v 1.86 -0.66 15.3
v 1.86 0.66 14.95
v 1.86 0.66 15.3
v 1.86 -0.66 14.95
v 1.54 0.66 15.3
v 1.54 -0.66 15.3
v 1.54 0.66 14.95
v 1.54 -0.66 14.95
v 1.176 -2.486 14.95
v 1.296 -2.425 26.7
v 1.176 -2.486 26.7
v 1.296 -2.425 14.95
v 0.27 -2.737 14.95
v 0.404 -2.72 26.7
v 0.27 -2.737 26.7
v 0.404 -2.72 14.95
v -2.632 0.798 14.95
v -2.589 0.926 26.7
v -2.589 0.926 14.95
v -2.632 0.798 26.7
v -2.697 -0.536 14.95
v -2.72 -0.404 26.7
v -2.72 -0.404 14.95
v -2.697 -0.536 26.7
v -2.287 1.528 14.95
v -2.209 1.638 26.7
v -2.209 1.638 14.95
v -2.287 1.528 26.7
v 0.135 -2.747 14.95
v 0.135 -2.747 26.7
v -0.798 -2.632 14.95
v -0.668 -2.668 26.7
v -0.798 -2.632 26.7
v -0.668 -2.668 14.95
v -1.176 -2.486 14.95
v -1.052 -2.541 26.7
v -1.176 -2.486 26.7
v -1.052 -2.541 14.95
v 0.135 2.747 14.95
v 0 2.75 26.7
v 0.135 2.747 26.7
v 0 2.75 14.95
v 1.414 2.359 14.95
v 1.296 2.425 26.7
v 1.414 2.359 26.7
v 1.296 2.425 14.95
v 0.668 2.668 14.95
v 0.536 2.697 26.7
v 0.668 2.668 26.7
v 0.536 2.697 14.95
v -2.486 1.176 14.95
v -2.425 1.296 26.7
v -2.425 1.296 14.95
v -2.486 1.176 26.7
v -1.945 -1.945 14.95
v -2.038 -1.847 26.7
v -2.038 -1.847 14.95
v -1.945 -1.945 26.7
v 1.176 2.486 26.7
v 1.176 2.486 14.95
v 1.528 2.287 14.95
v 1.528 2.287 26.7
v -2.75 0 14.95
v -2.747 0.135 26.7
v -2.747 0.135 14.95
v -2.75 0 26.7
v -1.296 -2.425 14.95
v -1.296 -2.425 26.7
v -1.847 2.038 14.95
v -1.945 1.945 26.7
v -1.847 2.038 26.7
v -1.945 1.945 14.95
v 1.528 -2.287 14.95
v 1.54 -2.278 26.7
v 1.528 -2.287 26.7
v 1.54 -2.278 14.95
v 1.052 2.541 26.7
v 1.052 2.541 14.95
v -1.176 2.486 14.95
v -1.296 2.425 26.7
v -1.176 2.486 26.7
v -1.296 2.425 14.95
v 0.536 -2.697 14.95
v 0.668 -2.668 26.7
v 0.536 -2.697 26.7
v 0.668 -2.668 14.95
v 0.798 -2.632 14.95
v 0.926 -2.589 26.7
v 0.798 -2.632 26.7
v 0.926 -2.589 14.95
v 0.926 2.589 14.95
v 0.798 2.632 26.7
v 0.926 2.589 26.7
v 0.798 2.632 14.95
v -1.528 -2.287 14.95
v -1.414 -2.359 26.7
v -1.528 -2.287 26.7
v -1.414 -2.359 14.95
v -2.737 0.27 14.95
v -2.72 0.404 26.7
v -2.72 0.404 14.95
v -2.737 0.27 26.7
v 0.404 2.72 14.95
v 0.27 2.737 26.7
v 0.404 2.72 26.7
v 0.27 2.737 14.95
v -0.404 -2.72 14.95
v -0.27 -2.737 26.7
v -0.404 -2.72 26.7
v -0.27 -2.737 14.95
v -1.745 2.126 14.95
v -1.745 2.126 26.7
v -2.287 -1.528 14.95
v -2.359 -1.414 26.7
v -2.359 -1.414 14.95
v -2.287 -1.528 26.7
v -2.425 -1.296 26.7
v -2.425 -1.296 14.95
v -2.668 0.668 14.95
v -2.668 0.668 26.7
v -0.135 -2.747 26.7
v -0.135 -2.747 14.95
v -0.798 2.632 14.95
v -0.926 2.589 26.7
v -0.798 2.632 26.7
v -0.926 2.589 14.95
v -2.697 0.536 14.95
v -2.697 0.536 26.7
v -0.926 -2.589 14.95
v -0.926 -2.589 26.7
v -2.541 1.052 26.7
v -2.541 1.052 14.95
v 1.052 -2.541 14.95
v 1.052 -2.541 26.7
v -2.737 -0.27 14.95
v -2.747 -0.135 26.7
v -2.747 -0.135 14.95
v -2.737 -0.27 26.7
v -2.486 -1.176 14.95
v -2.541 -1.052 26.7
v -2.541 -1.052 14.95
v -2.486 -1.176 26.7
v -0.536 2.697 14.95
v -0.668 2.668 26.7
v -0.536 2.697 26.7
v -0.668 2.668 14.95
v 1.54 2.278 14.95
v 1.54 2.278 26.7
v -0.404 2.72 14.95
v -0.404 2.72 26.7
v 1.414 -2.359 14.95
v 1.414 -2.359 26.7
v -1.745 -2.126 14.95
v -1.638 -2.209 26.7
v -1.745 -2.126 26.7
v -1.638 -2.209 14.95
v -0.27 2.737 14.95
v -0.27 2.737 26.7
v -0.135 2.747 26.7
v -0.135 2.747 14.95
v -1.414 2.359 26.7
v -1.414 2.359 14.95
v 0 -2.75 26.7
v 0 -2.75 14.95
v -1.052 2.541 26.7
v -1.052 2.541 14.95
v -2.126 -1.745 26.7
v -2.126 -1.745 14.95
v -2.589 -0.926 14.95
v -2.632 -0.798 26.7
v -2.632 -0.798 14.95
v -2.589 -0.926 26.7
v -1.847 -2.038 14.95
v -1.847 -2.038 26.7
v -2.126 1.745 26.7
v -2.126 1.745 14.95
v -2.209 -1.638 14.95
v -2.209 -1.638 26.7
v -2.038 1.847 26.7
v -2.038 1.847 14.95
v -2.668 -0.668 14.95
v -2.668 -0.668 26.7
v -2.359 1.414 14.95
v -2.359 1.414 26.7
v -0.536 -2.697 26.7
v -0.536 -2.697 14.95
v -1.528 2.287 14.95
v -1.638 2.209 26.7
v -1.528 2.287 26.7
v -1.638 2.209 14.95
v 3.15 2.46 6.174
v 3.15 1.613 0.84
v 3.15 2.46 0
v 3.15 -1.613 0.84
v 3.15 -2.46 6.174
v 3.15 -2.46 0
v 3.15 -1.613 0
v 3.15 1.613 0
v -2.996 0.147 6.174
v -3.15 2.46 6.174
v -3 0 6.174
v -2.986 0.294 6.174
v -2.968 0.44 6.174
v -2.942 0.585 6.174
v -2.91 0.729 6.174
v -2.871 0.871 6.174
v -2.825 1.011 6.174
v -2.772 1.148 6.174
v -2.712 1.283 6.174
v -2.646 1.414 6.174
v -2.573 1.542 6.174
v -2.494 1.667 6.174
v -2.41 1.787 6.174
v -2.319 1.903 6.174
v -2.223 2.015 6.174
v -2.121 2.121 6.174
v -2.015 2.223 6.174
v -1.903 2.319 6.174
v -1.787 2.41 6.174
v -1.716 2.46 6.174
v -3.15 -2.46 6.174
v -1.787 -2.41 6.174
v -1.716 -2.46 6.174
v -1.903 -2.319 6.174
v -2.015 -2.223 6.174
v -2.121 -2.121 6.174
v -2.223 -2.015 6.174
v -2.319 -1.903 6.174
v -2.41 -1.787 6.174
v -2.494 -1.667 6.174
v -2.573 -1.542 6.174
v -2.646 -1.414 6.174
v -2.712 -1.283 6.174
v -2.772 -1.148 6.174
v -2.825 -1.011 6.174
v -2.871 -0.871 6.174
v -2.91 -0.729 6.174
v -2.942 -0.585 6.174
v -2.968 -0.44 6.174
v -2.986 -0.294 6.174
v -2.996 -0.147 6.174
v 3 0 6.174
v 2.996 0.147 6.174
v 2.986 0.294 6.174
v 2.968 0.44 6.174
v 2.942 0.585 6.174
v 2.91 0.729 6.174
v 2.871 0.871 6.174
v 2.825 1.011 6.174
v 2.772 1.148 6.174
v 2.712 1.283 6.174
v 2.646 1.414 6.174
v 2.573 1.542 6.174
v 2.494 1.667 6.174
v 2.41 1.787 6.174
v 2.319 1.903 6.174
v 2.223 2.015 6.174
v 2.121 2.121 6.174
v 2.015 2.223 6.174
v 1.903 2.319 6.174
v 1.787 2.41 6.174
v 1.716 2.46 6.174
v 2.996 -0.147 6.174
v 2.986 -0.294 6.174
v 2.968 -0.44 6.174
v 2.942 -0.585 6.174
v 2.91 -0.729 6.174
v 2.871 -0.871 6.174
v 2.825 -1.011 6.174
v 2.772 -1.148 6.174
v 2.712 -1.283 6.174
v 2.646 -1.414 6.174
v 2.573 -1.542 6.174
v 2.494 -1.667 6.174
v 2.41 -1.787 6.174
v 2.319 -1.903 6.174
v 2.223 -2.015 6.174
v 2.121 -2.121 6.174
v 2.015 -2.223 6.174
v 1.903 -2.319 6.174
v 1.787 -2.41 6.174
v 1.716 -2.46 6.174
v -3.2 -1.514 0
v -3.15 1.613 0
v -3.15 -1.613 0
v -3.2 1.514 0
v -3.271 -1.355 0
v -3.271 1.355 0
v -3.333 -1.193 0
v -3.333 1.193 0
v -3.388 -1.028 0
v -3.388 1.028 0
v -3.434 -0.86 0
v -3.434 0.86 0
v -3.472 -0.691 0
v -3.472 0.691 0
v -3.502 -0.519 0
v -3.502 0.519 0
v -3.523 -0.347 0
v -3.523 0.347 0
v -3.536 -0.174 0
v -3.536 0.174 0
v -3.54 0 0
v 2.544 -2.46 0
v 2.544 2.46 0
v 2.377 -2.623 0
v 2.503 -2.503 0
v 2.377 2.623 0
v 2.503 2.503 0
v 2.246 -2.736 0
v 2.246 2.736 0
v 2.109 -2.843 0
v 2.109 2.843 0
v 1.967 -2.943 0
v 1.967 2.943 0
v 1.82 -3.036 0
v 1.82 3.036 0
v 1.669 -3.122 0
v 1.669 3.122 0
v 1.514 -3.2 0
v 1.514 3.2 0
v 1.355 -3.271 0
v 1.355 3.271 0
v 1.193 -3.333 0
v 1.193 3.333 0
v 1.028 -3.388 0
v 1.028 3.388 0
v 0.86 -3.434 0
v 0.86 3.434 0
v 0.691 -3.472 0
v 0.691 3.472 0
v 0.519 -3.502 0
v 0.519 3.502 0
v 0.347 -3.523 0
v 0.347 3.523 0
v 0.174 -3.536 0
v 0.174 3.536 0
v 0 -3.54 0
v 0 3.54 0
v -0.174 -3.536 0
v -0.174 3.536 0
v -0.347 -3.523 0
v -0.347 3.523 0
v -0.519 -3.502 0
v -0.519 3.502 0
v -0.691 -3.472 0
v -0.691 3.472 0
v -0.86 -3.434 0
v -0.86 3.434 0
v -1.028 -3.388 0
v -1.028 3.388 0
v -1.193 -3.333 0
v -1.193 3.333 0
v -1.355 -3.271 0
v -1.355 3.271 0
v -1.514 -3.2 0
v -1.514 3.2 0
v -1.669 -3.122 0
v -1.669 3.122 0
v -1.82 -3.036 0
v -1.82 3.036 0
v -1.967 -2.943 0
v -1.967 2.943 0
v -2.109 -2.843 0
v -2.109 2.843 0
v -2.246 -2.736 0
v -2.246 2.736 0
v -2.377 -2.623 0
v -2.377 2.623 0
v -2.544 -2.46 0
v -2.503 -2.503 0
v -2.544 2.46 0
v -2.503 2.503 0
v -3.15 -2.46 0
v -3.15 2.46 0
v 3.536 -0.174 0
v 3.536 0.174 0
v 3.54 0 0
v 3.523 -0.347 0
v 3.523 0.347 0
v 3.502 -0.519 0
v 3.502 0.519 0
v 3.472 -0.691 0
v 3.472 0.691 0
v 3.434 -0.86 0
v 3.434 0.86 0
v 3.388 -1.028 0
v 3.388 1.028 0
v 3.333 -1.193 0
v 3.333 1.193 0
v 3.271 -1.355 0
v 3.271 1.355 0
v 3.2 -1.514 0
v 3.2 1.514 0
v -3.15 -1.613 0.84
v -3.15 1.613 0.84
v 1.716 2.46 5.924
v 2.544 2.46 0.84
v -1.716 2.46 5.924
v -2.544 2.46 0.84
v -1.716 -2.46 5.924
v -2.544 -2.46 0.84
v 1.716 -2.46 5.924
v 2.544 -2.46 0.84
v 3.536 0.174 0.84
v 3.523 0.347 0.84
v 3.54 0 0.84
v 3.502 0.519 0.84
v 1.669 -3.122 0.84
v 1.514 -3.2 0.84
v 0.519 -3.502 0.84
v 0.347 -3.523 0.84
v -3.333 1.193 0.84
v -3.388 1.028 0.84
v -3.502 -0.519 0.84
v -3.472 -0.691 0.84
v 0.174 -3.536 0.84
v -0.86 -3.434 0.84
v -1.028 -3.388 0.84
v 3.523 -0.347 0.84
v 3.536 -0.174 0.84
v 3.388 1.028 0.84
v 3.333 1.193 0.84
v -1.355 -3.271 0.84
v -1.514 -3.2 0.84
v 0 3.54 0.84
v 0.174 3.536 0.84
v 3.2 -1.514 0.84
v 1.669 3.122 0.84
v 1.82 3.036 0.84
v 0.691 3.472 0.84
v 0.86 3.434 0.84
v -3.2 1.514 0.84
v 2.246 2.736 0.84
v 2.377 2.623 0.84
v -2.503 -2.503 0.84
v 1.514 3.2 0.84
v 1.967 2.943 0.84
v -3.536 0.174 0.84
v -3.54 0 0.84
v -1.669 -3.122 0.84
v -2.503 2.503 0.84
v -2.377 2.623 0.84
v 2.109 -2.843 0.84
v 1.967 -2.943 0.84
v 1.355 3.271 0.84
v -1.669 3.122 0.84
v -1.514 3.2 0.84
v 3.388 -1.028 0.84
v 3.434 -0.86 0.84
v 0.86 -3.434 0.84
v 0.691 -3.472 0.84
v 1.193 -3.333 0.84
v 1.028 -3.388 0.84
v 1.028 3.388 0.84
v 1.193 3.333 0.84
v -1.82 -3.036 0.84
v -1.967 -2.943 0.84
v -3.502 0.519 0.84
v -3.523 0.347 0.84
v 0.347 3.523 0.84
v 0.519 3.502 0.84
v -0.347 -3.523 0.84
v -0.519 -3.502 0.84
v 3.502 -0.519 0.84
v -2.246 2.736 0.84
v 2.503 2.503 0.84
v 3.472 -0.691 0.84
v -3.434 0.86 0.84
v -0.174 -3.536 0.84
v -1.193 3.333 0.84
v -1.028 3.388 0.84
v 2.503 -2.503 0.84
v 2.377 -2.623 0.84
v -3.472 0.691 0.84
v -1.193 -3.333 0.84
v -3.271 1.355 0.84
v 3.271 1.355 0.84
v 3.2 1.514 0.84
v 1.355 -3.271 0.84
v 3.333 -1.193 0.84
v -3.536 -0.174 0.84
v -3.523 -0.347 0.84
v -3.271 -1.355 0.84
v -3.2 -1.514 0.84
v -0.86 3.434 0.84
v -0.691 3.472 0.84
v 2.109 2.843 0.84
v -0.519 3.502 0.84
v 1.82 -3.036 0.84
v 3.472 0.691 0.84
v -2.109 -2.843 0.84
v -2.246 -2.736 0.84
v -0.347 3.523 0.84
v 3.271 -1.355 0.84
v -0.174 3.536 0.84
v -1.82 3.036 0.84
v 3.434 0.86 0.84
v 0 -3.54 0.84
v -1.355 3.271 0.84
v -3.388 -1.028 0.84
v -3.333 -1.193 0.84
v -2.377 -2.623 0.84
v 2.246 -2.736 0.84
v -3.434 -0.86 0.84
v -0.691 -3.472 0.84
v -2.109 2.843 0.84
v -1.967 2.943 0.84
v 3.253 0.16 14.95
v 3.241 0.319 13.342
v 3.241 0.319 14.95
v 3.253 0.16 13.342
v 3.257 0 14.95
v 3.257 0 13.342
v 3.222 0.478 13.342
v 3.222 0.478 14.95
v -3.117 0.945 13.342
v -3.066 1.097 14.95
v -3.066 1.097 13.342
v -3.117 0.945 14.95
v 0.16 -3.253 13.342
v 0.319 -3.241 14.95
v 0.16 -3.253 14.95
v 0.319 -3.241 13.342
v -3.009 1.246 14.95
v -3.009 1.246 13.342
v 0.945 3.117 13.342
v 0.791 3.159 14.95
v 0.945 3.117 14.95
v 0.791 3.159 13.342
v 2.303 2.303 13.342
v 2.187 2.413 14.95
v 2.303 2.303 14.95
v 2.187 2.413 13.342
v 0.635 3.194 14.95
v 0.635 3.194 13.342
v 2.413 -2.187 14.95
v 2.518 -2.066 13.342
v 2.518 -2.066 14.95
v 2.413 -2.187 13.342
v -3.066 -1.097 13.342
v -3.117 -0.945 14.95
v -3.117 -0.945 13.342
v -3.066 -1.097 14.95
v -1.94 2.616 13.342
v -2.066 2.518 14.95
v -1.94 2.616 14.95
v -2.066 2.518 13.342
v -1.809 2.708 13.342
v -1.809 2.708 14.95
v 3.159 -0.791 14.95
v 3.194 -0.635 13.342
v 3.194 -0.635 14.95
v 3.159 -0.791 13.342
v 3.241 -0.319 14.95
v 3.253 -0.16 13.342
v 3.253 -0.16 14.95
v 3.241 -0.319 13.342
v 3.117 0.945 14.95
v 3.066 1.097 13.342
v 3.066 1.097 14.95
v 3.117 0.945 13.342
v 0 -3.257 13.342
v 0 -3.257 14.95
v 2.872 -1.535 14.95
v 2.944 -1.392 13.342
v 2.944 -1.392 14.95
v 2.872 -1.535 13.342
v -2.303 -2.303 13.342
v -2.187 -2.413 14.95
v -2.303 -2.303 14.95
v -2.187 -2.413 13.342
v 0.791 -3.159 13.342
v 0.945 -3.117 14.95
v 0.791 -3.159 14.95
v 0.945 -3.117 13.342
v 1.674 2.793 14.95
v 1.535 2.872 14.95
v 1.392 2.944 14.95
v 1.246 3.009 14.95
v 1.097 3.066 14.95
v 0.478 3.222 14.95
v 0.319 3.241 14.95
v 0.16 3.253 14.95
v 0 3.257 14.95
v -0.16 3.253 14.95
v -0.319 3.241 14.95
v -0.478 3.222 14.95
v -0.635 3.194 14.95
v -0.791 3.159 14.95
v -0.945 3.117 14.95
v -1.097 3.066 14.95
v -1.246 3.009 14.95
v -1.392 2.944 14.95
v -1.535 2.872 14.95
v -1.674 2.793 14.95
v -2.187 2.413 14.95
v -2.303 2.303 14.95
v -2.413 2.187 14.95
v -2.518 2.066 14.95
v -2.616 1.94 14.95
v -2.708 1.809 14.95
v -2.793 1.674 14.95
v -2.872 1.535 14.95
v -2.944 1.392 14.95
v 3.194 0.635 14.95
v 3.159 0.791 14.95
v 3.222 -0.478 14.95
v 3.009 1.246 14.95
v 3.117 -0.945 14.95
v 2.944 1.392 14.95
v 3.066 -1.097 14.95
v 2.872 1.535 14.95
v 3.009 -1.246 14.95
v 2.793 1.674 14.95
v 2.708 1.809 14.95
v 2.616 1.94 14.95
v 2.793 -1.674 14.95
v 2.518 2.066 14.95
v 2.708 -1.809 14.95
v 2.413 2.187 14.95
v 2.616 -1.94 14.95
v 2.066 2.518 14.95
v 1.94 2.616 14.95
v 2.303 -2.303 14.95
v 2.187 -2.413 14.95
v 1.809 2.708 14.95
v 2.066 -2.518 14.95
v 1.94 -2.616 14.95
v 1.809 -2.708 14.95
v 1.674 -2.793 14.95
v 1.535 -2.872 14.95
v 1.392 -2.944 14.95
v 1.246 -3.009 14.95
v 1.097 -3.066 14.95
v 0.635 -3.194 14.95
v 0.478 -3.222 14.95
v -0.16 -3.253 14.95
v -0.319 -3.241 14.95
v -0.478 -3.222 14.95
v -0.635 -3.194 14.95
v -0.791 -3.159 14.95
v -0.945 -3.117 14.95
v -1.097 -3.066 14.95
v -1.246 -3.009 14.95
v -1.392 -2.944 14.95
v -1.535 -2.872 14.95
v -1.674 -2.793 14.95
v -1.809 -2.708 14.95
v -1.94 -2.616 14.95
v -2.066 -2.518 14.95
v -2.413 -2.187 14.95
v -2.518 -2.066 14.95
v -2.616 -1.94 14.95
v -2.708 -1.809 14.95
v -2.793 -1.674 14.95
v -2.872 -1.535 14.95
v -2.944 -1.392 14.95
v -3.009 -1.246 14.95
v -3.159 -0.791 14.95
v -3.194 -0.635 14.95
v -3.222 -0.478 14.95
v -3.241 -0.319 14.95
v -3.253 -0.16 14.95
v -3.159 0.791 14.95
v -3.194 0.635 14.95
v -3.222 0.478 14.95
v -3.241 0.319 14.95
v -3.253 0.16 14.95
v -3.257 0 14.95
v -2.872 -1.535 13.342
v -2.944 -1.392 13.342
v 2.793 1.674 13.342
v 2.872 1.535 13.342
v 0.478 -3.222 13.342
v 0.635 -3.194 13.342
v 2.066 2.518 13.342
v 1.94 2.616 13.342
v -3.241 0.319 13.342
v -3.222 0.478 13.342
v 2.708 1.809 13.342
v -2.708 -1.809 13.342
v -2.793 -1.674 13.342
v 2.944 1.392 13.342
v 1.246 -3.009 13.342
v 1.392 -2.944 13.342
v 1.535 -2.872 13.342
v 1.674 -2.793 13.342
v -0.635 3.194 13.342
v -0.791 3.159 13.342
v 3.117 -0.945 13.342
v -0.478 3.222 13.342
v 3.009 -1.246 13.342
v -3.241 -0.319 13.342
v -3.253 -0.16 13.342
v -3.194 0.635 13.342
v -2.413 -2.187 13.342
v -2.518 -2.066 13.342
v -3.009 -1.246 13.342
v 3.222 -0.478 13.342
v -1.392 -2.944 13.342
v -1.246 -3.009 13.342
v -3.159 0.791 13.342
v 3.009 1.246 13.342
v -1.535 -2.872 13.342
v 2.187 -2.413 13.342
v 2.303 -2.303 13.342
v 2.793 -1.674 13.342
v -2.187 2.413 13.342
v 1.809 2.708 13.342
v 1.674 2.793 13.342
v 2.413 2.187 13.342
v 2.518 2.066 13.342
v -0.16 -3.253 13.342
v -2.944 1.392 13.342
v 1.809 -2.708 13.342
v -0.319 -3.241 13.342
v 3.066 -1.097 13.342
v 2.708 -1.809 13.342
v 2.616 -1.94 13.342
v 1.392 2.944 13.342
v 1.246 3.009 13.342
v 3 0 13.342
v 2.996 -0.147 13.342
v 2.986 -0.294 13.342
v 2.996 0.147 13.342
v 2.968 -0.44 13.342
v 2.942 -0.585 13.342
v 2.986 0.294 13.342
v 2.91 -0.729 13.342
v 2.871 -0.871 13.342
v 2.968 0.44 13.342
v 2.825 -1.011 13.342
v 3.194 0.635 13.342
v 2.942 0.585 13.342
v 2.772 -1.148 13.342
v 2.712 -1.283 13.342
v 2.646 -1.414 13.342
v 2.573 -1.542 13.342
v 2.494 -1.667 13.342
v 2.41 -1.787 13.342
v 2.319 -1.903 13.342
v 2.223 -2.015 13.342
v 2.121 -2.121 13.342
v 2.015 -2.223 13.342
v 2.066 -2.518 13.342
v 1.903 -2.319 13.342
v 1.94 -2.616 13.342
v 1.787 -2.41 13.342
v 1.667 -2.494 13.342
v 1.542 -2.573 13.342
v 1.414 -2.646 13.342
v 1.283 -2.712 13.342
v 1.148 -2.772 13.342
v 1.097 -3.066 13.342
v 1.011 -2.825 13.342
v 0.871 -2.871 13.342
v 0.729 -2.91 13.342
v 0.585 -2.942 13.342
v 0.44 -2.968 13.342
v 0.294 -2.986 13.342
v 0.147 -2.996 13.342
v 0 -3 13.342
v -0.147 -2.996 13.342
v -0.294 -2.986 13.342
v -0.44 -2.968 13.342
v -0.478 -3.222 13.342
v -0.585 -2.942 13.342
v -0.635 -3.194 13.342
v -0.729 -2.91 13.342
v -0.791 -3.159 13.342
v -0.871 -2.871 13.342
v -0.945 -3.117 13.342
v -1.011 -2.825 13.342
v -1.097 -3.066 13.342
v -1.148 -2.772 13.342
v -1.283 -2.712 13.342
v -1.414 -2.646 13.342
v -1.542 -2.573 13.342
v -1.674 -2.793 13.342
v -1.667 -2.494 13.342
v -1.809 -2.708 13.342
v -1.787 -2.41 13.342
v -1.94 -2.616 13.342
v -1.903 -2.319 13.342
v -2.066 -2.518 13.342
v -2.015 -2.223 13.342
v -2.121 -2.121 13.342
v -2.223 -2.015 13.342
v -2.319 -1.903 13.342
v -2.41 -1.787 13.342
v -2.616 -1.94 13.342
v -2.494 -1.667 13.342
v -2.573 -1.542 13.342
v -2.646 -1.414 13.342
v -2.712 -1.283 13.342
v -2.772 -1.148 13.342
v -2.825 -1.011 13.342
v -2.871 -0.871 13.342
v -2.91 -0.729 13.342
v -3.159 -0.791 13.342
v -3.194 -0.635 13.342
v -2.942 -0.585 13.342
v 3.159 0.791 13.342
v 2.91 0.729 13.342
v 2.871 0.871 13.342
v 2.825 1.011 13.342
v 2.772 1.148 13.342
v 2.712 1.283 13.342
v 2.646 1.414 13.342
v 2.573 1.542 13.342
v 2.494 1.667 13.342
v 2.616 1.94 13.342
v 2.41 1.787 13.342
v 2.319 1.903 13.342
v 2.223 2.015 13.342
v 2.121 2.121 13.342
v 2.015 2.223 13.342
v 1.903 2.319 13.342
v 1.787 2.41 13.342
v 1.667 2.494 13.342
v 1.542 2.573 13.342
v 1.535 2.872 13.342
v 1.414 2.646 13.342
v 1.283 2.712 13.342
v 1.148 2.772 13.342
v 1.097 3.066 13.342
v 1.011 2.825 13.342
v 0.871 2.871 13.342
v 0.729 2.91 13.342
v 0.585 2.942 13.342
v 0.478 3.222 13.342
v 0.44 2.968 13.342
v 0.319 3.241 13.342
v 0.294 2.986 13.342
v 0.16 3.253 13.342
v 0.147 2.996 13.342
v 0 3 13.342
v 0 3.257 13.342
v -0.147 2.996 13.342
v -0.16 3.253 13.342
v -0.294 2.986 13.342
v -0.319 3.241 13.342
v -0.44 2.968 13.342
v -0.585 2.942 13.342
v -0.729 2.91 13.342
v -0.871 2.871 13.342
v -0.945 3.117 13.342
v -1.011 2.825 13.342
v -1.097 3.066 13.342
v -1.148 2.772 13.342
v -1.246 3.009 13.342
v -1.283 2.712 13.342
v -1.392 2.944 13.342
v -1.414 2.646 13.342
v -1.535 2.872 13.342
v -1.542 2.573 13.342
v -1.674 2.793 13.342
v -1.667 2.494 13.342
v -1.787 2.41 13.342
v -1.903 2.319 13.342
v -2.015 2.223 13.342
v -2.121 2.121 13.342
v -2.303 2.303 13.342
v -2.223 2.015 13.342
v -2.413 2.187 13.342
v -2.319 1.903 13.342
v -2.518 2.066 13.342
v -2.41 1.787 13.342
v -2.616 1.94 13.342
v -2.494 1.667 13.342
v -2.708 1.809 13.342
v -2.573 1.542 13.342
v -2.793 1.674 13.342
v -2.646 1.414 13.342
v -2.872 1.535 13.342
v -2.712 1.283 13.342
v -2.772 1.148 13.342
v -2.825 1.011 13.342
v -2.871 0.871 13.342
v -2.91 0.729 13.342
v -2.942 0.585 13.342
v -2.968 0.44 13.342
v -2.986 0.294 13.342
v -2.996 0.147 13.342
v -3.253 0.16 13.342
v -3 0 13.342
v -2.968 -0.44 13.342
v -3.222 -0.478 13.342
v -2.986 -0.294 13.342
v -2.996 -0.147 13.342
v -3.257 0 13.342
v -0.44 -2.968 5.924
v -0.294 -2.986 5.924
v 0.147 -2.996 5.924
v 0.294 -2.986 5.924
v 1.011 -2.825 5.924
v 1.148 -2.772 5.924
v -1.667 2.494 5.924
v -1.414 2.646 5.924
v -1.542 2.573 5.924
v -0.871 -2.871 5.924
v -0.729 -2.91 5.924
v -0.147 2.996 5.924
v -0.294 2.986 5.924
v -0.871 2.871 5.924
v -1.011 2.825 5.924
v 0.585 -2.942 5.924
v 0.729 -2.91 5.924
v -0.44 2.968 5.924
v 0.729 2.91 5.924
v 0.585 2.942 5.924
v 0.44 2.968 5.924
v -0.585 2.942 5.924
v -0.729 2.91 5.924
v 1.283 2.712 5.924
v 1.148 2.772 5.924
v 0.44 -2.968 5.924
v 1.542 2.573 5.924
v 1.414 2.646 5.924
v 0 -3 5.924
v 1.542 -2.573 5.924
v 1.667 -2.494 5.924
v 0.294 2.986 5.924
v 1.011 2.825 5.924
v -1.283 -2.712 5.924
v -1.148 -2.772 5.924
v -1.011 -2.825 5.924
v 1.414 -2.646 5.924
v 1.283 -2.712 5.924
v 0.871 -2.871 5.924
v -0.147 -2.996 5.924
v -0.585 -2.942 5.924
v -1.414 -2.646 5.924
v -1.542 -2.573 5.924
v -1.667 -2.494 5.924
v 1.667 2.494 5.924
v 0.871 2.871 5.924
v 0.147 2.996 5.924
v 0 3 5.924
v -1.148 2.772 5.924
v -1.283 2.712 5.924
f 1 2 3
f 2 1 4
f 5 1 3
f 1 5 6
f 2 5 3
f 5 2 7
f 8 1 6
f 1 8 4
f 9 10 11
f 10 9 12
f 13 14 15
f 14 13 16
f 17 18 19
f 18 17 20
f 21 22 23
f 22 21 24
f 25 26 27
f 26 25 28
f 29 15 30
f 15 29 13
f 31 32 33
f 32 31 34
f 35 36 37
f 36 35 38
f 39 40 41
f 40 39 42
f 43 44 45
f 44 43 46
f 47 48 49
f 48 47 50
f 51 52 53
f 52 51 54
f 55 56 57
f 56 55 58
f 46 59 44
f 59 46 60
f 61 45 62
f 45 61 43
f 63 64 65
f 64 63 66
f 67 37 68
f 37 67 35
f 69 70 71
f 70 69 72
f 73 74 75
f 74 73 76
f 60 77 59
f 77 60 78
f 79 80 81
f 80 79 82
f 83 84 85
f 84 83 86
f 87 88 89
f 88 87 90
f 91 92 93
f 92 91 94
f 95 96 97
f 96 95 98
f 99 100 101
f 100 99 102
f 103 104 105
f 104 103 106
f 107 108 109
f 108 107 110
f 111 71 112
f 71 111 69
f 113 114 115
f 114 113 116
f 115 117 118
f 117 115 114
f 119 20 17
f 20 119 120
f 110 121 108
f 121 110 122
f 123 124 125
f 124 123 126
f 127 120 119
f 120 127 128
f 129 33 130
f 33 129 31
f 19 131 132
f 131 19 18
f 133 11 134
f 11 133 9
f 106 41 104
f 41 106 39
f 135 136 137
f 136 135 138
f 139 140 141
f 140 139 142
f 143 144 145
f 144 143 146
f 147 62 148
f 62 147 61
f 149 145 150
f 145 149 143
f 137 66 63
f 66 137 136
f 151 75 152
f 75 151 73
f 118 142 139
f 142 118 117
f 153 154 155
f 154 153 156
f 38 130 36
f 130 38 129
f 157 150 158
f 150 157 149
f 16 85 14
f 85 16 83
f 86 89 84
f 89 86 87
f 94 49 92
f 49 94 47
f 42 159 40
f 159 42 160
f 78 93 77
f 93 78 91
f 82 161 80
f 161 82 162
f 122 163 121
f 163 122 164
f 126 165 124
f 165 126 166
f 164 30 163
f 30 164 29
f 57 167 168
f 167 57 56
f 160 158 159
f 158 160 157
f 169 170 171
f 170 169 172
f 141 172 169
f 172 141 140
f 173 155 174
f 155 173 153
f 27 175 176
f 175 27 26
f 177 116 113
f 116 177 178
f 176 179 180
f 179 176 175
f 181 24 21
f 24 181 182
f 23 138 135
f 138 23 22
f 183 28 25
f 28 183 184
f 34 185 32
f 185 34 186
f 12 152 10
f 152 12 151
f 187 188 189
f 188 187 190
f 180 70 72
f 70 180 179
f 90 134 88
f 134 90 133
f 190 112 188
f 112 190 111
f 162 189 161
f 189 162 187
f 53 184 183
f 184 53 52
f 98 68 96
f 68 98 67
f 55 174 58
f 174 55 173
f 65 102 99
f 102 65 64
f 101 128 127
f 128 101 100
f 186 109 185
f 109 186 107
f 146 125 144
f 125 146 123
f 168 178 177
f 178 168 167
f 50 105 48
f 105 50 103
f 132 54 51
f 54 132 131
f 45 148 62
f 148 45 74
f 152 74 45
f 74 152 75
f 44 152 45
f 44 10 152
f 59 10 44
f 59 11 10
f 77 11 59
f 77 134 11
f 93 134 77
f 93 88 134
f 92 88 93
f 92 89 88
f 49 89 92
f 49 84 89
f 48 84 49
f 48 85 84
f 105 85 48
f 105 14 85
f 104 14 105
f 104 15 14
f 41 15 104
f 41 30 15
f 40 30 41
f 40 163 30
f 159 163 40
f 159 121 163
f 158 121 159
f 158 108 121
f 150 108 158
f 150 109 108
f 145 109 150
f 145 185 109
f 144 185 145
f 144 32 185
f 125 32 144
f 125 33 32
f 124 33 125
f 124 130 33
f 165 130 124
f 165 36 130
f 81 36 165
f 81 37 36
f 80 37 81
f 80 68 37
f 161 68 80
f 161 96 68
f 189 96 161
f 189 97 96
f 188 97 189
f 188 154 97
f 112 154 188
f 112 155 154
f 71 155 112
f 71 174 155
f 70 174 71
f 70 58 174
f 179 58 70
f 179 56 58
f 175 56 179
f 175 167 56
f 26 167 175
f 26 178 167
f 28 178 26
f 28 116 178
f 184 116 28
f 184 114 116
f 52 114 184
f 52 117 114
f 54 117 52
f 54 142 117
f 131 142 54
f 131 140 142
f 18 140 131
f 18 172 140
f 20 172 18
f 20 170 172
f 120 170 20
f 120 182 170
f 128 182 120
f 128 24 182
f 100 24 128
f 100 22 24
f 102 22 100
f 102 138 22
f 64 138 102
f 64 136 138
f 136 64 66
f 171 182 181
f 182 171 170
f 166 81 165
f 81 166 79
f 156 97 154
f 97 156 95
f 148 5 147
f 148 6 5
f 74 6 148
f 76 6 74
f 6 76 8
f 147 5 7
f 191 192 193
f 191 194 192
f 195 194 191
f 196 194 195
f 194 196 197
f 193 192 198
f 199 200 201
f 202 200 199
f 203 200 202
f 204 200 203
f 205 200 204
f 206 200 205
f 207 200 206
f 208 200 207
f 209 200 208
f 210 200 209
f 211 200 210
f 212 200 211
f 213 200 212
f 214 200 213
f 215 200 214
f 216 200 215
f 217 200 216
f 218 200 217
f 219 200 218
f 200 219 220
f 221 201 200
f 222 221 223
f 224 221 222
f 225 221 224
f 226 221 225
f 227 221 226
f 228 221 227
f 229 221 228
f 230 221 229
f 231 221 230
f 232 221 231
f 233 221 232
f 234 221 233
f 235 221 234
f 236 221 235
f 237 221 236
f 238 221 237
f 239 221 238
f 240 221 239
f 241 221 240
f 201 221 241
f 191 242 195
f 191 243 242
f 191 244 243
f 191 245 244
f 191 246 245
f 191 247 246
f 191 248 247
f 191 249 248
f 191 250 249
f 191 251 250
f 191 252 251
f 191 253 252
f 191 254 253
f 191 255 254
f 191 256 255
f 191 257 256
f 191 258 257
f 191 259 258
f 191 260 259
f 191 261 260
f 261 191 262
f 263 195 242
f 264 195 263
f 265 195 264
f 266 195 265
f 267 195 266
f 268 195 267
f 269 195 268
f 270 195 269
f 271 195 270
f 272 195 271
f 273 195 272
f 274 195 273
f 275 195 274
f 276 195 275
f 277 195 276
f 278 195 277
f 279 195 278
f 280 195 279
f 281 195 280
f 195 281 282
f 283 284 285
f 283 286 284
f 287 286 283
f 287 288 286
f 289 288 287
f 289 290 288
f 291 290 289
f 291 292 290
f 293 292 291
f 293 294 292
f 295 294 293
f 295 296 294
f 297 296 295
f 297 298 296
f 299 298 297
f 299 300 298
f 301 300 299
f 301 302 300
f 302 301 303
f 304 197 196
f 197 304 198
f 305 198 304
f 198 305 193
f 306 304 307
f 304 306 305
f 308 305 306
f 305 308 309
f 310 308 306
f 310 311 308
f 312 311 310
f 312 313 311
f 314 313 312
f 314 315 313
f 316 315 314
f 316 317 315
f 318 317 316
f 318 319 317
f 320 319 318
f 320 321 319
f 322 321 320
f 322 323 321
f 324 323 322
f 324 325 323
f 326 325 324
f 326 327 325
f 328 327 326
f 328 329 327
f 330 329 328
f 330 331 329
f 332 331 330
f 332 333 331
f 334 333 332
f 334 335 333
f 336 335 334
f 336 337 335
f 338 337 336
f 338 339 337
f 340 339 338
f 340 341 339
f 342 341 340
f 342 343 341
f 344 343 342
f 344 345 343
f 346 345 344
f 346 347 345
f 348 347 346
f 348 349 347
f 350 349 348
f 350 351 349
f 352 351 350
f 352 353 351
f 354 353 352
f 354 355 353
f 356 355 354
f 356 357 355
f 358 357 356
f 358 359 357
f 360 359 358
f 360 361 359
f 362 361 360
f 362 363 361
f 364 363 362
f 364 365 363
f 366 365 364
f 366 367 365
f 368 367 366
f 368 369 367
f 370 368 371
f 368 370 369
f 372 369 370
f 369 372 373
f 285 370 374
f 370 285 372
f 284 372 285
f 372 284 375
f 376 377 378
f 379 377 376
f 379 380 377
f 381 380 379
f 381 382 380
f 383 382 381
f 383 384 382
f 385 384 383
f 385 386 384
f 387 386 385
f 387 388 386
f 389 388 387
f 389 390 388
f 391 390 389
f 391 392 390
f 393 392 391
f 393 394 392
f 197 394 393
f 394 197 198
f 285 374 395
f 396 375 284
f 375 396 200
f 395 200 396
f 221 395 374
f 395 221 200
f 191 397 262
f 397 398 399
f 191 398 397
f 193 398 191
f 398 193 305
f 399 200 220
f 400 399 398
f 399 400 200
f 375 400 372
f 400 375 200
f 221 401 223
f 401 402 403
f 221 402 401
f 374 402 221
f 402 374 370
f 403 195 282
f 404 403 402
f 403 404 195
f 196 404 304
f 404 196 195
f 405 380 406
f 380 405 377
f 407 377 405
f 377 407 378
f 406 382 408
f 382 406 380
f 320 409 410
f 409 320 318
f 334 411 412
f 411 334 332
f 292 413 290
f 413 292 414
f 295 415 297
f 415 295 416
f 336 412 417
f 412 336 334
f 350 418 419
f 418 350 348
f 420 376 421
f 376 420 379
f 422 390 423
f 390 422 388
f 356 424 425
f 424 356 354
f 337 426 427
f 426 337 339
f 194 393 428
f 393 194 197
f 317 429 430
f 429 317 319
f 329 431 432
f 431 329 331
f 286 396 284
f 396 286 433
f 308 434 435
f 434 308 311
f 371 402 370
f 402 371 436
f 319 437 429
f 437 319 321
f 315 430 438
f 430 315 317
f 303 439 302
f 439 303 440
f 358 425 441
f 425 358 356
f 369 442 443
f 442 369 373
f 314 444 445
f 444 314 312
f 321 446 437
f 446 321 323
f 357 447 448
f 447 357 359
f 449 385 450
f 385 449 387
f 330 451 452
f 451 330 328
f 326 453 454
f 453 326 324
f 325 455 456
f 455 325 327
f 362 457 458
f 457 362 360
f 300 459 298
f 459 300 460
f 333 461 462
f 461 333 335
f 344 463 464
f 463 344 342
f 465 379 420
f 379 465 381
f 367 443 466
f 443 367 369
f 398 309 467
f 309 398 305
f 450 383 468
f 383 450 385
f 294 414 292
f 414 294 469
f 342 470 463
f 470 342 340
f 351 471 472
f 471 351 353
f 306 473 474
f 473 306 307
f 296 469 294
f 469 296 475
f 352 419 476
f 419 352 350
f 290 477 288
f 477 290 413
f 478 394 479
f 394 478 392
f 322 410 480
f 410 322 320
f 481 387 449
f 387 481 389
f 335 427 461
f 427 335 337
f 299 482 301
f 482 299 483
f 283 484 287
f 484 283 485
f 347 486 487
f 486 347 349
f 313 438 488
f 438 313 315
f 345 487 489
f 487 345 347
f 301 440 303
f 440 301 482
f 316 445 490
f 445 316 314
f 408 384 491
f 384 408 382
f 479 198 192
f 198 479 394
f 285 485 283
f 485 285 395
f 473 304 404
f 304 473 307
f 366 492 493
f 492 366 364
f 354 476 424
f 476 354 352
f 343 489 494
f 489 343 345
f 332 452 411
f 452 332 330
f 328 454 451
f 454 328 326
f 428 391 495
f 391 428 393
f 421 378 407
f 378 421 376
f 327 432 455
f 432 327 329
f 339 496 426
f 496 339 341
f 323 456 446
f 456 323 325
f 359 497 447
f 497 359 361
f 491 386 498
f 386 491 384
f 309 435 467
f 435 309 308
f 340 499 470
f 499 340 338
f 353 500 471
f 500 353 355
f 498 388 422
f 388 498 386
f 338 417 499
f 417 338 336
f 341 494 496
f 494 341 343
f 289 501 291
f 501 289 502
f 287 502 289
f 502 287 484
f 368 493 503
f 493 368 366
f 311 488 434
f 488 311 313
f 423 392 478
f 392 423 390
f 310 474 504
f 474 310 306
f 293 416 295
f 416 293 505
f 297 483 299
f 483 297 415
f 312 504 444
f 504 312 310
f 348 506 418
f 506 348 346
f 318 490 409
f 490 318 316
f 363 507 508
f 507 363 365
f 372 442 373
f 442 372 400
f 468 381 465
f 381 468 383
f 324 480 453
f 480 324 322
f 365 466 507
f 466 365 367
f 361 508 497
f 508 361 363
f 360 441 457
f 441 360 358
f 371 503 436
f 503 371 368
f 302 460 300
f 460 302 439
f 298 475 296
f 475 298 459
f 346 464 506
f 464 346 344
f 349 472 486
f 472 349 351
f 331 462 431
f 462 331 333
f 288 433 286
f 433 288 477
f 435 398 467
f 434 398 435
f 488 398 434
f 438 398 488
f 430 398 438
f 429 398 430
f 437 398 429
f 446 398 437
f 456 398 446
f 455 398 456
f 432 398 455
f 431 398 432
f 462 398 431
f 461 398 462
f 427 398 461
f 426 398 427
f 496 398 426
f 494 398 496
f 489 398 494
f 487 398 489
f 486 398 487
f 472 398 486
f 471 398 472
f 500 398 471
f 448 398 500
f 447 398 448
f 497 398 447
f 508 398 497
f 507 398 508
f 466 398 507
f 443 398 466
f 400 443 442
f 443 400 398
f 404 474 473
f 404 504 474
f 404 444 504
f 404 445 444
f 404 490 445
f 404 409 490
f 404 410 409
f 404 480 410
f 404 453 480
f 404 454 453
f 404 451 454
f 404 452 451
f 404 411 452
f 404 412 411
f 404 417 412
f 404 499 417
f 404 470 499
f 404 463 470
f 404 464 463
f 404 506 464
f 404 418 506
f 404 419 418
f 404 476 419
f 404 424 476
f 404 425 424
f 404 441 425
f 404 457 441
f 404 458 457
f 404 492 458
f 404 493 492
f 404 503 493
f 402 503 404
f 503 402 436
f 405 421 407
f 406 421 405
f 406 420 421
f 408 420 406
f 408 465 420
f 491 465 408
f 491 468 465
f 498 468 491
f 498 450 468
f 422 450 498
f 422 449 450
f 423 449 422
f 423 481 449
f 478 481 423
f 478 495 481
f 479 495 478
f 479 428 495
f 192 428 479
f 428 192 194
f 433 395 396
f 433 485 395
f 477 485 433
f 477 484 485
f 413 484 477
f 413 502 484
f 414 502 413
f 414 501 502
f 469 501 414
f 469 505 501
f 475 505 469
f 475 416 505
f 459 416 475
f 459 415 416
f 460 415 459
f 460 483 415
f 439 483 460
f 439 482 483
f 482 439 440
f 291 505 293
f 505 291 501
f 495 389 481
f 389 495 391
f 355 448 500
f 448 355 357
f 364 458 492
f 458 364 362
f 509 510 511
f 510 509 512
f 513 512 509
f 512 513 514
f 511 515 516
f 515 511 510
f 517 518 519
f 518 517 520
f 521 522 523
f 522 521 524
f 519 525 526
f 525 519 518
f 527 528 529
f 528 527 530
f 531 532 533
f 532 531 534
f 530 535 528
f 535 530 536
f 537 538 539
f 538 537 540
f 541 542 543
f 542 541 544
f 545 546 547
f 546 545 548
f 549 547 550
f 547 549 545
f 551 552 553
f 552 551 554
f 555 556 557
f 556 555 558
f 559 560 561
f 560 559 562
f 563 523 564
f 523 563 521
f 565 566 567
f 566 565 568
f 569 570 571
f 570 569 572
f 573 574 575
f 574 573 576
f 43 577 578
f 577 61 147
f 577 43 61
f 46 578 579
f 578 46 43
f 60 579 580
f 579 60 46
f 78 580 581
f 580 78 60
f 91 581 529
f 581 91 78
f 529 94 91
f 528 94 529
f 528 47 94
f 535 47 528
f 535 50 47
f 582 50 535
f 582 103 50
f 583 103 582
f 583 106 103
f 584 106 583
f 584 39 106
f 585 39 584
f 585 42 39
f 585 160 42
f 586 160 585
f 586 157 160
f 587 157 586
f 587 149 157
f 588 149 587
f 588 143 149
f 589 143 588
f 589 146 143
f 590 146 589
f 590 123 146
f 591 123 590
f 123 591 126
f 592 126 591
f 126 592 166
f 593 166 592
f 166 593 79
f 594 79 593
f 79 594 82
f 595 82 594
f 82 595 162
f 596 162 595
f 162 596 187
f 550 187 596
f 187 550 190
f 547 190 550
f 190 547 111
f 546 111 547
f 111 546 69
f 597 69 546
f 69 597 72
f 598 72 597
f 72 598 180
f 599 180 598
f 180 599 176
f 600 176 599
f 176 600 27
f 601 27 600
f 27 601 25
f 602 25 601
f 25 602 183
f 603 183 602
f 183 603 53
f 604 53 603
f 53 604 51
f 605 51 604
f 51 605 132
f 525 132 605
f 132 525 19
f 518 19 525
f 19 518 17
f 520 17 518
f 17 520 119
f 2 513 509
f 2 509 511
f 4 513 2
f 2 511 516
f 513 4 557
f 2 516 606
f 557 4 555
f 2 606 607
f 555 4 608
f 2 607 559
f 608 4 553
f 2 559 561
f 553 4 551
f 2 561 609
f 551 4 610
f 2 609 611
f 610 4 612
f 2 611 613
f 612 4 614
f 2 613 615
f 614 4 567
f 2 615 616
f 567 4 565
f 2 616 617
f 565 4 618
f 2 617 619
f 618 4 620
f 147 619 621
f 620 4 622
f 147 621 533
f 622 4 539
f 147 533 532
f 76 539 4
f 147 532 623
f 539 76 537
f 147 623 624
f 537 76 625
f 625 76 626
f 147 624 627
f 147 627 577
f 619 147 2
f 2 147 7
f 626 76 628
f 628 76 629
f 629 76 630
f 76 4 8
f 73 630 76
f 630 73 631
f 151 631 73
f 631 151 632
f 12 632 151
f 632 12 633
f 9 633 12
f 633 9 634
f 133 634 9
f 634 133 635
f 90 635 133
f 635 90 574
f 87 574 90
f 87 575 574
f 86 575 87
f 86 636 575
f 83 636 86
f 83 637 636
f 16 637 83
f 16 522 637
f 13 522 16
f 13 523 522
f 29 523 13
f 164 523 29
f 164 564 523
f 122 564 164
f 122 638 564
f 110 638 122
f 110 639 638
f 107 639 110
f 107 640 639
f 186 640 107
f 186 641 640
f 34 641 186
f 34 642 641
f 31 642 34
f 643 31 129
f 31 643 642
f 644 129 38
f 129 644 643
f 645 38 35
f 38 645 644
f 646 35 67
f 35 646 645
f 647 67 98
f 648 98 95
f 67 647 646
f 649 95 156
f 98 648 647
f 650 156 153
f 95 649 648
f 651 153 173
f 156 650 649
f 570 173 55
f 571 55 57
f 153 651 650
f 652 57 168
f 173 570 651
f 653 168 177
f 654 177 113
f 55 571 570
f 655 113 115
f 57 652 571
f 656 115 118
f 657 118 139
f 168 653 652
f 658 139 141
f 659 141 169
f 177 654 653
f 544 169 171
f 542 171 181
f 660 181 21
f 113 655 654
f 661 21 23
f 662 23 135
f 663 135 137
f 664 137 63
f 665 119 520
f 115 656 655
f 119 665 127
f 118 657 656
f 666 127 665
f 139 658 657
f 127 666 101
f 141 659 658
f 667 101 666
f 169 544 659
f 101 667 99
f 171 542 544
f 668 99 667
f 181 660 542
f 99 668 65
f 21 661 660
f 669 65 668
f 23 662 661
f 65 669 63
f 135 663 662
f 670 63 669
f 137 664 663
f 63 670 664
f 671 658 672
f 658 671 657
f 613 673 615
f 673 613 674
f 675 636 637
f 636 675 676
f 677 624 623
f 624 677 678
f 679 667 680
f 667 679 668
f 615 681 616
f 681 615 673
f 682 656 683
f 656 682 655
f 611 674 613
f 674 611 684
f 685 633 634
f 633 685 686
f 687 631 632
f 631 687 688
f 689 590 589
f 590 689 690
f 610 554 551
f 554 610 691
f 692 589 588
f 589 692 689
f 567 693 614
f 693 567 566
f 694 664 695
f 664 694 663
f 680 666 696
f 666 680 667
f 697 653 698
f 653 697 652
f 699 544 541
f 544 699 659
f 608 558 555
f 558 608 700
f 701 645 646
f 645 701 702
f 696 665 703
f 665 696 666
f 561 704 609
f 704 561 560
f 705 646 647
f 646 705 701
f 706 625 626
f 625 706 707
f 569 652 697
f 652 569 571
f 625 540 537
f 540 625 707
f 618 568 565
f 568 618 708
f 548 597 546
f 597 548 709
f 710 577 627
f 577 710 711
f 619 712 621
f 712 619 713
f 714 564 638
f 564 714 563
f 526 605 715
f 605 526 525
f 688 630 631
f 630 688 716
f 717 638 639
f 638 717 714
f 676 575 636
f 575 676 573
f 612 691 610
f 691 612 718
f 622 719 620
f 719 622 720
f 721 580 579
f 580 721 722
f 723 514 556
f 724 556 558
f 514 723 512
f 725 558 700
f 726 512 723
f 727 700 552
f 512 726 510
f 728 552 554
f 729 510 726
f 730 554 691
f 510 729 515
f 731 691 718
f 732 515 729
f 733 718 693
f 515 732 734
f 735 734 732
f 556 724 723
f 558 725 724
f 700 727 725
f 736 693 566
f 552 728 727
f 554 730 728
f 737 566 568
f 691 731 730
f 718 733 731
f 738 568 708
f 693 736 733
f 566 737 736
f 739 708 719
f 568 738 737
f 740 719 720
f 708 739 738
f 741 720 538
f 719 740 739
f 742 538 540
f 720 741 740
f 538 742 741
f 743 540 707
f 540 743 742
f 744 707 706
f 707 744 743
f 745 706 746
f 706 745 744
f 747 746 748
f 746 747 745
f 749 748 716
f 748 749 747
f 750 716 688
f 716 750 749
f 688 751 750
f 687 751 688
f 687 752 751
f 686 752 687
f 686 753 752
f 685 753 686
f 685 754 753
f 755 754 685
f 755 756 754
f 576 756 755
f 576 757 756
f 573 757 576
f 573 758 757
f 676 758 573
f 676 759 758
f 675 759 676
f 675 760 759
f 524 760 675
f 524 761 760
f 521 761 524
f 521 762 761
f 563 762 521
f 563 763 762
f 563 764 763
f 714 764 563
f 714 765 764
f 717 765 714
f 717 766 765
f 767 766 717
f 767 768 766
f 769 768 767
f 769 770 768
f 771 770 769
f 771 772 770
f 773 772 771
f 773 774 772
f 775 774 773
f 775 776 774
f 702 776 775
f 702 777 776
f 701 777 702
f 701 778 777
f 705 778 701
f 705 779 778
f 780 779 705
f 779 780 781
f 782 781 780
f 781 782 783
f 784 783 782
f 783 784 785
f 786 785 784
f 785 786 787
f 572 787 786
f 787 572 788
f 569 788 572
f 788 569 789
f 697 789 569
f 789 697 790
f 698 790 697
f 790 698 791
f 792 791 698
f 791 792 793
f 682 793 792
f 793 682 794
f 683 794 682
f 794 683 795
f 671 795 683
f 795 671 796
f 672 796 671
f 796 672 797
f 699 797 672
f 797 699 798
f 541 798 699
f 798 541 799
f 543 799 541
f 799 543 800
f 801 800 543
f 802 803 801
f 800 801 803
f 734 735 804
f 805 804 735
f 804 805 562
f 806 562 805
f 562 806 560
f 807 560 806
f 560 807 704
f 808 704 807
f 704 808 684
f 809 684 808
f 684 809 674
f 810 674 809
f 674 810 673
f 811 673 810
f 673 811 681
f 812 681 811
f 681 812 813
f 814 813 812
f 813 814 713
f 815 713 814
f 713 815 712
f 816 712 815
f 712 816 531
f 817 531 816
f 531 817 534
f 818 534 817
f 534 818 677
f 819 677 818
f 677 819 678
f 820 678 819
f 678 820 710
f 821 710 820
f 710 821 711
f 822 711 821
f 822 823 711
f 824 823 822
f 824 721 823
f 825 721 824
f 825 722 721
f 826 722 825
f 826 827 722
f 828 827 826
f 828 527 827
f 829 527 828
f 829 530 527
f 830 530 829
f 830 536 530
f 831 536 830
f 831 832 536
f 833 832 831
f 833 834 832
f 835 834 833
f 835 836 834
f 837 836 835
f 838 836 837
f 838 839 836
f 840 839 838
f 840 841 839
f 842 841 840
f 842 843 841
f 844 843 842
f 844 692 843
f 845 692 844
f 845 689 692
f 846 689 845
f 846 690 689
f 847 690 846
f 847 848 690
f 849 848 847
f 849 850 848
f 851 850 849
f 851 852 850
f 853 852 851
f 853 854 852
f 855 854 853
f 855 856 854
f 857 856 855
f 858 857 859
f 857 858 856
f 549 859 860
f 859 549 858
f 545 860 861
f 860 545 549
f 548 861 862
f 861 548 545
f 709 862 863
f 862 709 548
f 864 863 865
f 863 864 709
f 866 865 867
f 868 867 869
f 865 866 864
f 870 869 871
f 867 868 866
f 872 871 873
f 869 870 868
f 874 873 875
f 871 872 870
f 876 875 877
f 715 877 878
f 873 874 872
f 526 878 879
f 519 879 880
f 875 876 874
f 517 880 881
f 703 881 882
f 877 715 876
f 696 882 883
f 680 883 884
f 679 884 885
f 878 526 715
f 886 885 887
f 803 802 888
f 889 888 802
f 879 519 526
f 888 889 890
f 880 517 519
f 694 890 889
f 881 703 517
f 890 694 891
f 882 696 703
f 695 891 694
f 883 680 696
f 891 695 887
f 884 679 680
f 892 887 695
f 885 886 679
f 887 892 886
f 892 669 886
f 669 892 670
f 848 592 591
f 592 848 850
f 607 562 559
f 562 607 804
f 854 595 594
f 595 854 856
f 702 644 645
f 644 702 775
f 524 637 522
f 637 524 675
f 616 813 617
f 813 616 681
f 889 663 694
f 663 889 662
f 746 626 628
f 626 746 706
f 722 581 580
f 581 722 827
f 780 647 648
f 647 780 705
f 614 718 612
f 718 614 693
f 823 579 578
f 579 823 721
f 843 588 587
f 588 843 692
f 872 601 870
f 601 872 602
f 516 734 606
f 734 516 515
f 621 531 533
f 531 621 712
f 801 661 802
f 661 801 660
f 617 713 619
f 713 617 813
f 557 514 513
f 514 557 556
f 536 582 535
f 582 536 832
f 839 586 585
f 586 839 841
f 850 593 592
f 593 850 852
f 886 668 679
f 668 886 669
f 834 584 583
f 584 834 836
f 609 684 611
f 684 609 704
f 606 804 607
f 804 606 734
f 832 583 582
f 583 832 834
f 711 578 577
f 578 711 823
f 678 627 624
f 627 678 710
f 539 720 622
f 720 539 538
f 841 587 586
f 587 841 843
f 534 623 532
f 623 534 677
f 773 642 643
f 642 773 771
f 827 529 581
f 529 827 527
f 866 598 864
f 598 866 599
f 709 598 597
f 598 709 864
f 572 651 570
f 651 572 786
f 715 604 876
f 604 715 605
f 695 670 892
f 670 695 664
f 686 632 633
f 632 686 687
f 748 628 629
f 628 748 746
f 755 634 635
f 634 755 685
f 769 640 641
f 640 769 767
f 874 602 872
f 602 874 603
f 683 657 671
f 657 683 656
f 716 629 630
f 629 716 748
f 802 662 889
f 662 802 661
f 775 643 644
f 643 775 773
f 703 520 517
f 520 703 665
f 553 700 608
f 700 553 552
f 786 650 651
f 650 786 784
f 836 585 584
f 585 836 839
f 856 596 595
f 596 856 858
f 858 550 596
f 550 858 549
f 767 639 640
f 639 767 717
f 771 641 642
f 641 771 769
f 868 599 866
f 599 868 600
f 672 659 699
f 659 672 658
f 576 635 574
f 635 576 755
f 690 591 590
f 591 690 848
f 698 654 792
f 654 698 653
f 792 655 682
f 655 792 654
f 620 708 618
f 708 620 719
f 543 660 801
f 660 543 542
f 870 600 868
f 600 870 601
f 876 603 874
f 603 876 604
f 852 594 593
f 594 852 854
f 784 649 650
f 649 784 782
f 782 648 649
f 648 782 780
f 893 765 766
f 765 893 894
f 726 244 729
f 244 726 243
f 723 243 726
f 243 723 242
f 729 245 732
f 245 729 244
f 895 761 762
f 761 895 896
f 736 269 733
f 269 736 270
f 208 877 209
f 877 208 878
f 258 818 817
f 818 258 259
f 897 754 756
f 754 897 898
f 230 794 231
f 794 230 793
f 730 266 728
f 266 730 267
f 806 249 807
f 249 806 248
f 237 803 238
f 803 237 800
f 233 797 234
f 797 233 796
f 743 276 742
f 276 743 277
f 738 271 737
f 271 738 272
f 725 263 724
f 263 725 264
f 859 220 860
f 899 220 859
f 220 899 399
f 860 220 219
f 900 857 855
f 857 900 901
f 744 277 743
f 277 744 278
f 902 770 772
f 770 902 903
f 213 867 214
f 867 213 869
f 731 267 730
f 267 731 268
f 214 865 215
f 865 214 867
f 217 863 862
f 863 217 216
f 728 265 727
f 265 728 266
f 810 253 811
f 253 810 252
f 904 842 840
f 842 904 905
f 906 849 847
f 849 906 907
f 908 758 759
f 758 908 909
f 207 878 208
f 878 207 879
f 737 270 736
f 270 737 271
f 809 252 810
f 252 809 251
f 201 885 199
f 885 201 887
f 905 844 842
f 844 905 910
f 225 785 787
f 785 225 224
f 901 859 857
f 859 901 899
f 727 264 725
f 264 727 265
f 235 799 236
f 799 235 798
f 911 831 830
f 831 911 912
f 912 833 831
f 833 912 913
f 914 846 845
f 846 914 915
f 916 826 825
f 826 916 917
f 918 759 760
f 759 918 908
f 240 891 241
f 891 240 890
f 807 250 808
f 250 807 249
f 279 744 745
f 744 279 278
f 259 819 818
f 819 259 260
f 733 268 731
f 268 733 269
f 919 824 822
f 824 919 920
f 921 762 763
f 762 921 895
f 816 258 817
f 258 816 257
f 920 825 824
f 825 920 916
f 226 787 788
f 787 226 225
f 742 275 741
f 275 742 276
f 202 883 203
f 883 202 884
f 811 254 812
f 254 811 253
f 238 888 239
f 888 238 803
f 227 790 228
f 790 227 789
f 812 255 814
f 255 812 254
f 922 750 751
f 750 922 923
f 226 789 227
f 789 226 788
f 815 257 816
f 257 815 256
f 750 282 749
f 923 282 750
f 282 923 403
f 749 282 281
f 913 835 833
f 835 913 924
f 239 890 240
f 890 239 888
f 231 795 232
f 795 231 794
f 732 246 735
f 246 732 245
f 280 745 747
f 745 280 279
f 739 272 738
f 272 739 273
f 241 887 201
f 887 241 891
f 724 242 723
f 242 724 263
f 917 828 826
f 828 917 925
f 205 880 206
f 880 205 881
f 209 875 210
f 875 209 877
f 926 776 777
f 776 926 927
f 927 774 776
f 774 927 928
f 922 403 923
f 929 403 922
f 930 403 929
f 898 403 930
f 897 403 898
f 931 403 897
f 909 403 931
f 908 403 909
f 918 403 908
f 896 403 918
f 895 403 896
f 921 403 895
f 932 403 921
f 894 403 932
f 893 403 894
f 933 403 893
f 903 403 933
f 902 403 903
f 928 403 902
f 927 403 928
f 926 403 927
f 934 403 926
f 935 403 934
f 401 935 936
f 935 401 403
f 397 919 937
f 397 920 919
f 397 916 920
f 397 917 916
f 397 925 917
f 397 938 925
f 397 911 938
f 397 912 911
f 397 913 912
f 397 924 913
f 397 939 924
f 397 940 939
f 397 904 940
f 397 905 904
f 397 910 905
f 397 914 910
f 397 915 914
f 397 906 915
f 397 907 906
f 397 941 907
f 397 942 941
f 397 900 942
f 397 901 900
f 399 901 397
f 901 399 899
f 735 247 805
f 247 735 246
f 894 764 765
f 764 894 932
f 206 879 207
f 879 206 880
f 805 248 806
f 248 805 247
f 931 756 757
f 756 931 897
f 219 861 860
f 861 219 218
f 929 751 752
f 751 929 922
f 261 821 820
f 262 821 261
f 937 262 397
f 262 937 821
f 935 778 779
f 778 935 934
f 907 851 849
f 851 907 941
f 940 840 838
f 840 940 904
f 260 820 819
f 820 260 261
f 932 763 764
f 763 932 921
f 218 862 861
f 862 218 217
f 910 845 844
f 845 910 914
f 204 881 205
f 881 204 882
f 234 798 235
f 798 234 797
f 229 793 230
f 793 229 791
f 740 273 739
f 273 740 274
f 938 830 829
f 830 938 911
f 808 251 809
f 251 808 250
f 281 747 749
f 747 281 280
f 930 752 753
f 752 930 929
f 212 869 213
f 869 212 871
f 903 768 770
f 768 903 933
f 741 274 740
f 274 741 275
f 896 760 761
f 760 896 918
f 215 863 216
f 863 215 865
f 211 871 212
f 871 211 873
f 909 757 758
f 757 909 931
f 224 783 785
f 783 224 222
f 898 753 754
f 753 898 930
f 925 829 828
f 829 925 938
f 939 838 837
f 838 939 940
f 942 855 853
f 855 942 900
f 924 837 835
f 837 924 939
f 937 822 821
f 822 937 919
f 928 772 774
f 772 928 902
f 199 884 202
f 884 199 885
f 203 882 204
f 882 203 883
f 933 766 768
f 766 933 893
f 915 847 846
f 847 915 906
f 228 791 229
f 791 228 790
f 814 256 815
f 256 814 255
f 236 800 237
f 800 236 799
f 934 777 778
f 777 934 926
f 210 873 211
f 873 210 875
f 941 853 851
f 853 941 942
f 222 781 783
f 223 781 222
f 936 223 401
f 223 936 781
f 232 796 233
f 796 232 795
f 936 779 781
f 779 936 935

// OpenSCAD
$fn = 128;

// Target dimensions: [motor_d, shaft_d, body_len, shaft_len]
motor_d  = 6;
shaft_d  = 5.5;
body_len = 14.7;
shaft_len= 12;

module gear_motor(motor_d=6, shaft_d=5.5, body_len=14.7, shaft_len=12) {

    // Small overlap to guarantee a single connected solid
    eps = 0.25;

    // Split body into gearbox + motor can (sum must equal body_len)
    gb_len = body_len * 0.42;
    m_len  = body_len - gb_len;

    // Gearbox block proportions (distinct from motor cylinder)
    gb_w = motor_d * 1.05;
    gb_h = motor_d * 0.82;

    // Front face features
    flange_t = max(0.6, motor_d * 0.14);
    flange_d = motor_d * 1.18;

    // Output boss at gearbox face
    boss_len = max(0.7, gb_len * 0.22);
    boss_d   = min(flange_d * 0.92, shaft_d * 1.35);

    // Shaft D-flat
    shaft_flat = shaft_d * 0.22;

    // Rear cap + small terminals to make it look like a motor
    cap_t = max(0.6, motor_d * 0.12);
    term_w = motor_d * 0.18;
    term_h = motor_d * 0.22;
    term_l = motor_d * 0.22;

    // Gear detail on front (teeth protrude outward)
    gear_h    = flange_t * 0.85;
    hub_d     = flange_d * 0.78;
    tooth_len = flange_d * 0.14;
    tooth_w   = flange_d * 0.11;
    teeth     = 12;
    overlap   = tooth_len * 0.35;

    union() {

        // --- Gearbox housing (rectangular) at front: z = 0 .. gb_len
        translate([0, 0, gb_len/2])
            cube([gb_w, gb_h, gb_len], center=true);

        // --- Front flange at very front: z = 0 .. flange_t
        translate([0, 0, flange_t/2])
            cylinder(d=flange_d, h=flange_t, center=true);

        // --- Gear teeth detail on front face (connected to flange)
        translate([0, 0, gear_h/2])
        union() {
            cylinder(d=hub_d, h=gear_h, center=true);
            for (i = [0:teeth-1])
                rotate([0, 0, i * 360/teeth])
                    translate([hub_d/2 + tooth_len/2 - overlap, 0, 0])
                        cube([tooth_len, tooth_w, gear_h], center=true);
        }

        // --- Output boss at gearbox face (connected), ends at z=body_len
        translate([0, 0, body_len - boss_len/2 + eps/2])
            cylinder(d=boss_d, h=boss_len + eps, center=true);

        // --- Motor can (cylindrical) behind gearbox: z = gb_len .. body_len
        translate([0, 0, gb_len + m_len/2 - eps/2])
            cylinder(d=motor_d, h=m_len + eps, center=true);

        // --- Rear cap ring (adds detail), at back end of motor can
        translate([0, 0, body_len - cap_t/2 + eps/2])
            cylinder(d=motor_d * 0.96, h=cap_t + eps, center=true);

        // --- Two small rear terminals (connected to rear cap)
        for (sx = [-1, 1]) {
            translate([sx*(motor_d*0.22), 0, body_len - cap_t + term_l/2])
                cube([term_w, term_h, term_l], center=true);
        }

        // --- Output shaft with D-flat, starting at z=body_len
        translate([0, 0, body_len + shaft_len/2 - eps/2])
        difference() {
            cylinder(d=shaft_d, h=shaft_len + eps, center=true);
            // Cut a flat along +X side
            translate([shaft_d/2 - shaft_flat/2, 0, 0])
                cube([shaft_flat, shaft_d*1.3, shaft_len + eps + 1], center=true);
        }
    }
}

gear_motor(motor_d, shaft_d, body_len, shaft_len);
